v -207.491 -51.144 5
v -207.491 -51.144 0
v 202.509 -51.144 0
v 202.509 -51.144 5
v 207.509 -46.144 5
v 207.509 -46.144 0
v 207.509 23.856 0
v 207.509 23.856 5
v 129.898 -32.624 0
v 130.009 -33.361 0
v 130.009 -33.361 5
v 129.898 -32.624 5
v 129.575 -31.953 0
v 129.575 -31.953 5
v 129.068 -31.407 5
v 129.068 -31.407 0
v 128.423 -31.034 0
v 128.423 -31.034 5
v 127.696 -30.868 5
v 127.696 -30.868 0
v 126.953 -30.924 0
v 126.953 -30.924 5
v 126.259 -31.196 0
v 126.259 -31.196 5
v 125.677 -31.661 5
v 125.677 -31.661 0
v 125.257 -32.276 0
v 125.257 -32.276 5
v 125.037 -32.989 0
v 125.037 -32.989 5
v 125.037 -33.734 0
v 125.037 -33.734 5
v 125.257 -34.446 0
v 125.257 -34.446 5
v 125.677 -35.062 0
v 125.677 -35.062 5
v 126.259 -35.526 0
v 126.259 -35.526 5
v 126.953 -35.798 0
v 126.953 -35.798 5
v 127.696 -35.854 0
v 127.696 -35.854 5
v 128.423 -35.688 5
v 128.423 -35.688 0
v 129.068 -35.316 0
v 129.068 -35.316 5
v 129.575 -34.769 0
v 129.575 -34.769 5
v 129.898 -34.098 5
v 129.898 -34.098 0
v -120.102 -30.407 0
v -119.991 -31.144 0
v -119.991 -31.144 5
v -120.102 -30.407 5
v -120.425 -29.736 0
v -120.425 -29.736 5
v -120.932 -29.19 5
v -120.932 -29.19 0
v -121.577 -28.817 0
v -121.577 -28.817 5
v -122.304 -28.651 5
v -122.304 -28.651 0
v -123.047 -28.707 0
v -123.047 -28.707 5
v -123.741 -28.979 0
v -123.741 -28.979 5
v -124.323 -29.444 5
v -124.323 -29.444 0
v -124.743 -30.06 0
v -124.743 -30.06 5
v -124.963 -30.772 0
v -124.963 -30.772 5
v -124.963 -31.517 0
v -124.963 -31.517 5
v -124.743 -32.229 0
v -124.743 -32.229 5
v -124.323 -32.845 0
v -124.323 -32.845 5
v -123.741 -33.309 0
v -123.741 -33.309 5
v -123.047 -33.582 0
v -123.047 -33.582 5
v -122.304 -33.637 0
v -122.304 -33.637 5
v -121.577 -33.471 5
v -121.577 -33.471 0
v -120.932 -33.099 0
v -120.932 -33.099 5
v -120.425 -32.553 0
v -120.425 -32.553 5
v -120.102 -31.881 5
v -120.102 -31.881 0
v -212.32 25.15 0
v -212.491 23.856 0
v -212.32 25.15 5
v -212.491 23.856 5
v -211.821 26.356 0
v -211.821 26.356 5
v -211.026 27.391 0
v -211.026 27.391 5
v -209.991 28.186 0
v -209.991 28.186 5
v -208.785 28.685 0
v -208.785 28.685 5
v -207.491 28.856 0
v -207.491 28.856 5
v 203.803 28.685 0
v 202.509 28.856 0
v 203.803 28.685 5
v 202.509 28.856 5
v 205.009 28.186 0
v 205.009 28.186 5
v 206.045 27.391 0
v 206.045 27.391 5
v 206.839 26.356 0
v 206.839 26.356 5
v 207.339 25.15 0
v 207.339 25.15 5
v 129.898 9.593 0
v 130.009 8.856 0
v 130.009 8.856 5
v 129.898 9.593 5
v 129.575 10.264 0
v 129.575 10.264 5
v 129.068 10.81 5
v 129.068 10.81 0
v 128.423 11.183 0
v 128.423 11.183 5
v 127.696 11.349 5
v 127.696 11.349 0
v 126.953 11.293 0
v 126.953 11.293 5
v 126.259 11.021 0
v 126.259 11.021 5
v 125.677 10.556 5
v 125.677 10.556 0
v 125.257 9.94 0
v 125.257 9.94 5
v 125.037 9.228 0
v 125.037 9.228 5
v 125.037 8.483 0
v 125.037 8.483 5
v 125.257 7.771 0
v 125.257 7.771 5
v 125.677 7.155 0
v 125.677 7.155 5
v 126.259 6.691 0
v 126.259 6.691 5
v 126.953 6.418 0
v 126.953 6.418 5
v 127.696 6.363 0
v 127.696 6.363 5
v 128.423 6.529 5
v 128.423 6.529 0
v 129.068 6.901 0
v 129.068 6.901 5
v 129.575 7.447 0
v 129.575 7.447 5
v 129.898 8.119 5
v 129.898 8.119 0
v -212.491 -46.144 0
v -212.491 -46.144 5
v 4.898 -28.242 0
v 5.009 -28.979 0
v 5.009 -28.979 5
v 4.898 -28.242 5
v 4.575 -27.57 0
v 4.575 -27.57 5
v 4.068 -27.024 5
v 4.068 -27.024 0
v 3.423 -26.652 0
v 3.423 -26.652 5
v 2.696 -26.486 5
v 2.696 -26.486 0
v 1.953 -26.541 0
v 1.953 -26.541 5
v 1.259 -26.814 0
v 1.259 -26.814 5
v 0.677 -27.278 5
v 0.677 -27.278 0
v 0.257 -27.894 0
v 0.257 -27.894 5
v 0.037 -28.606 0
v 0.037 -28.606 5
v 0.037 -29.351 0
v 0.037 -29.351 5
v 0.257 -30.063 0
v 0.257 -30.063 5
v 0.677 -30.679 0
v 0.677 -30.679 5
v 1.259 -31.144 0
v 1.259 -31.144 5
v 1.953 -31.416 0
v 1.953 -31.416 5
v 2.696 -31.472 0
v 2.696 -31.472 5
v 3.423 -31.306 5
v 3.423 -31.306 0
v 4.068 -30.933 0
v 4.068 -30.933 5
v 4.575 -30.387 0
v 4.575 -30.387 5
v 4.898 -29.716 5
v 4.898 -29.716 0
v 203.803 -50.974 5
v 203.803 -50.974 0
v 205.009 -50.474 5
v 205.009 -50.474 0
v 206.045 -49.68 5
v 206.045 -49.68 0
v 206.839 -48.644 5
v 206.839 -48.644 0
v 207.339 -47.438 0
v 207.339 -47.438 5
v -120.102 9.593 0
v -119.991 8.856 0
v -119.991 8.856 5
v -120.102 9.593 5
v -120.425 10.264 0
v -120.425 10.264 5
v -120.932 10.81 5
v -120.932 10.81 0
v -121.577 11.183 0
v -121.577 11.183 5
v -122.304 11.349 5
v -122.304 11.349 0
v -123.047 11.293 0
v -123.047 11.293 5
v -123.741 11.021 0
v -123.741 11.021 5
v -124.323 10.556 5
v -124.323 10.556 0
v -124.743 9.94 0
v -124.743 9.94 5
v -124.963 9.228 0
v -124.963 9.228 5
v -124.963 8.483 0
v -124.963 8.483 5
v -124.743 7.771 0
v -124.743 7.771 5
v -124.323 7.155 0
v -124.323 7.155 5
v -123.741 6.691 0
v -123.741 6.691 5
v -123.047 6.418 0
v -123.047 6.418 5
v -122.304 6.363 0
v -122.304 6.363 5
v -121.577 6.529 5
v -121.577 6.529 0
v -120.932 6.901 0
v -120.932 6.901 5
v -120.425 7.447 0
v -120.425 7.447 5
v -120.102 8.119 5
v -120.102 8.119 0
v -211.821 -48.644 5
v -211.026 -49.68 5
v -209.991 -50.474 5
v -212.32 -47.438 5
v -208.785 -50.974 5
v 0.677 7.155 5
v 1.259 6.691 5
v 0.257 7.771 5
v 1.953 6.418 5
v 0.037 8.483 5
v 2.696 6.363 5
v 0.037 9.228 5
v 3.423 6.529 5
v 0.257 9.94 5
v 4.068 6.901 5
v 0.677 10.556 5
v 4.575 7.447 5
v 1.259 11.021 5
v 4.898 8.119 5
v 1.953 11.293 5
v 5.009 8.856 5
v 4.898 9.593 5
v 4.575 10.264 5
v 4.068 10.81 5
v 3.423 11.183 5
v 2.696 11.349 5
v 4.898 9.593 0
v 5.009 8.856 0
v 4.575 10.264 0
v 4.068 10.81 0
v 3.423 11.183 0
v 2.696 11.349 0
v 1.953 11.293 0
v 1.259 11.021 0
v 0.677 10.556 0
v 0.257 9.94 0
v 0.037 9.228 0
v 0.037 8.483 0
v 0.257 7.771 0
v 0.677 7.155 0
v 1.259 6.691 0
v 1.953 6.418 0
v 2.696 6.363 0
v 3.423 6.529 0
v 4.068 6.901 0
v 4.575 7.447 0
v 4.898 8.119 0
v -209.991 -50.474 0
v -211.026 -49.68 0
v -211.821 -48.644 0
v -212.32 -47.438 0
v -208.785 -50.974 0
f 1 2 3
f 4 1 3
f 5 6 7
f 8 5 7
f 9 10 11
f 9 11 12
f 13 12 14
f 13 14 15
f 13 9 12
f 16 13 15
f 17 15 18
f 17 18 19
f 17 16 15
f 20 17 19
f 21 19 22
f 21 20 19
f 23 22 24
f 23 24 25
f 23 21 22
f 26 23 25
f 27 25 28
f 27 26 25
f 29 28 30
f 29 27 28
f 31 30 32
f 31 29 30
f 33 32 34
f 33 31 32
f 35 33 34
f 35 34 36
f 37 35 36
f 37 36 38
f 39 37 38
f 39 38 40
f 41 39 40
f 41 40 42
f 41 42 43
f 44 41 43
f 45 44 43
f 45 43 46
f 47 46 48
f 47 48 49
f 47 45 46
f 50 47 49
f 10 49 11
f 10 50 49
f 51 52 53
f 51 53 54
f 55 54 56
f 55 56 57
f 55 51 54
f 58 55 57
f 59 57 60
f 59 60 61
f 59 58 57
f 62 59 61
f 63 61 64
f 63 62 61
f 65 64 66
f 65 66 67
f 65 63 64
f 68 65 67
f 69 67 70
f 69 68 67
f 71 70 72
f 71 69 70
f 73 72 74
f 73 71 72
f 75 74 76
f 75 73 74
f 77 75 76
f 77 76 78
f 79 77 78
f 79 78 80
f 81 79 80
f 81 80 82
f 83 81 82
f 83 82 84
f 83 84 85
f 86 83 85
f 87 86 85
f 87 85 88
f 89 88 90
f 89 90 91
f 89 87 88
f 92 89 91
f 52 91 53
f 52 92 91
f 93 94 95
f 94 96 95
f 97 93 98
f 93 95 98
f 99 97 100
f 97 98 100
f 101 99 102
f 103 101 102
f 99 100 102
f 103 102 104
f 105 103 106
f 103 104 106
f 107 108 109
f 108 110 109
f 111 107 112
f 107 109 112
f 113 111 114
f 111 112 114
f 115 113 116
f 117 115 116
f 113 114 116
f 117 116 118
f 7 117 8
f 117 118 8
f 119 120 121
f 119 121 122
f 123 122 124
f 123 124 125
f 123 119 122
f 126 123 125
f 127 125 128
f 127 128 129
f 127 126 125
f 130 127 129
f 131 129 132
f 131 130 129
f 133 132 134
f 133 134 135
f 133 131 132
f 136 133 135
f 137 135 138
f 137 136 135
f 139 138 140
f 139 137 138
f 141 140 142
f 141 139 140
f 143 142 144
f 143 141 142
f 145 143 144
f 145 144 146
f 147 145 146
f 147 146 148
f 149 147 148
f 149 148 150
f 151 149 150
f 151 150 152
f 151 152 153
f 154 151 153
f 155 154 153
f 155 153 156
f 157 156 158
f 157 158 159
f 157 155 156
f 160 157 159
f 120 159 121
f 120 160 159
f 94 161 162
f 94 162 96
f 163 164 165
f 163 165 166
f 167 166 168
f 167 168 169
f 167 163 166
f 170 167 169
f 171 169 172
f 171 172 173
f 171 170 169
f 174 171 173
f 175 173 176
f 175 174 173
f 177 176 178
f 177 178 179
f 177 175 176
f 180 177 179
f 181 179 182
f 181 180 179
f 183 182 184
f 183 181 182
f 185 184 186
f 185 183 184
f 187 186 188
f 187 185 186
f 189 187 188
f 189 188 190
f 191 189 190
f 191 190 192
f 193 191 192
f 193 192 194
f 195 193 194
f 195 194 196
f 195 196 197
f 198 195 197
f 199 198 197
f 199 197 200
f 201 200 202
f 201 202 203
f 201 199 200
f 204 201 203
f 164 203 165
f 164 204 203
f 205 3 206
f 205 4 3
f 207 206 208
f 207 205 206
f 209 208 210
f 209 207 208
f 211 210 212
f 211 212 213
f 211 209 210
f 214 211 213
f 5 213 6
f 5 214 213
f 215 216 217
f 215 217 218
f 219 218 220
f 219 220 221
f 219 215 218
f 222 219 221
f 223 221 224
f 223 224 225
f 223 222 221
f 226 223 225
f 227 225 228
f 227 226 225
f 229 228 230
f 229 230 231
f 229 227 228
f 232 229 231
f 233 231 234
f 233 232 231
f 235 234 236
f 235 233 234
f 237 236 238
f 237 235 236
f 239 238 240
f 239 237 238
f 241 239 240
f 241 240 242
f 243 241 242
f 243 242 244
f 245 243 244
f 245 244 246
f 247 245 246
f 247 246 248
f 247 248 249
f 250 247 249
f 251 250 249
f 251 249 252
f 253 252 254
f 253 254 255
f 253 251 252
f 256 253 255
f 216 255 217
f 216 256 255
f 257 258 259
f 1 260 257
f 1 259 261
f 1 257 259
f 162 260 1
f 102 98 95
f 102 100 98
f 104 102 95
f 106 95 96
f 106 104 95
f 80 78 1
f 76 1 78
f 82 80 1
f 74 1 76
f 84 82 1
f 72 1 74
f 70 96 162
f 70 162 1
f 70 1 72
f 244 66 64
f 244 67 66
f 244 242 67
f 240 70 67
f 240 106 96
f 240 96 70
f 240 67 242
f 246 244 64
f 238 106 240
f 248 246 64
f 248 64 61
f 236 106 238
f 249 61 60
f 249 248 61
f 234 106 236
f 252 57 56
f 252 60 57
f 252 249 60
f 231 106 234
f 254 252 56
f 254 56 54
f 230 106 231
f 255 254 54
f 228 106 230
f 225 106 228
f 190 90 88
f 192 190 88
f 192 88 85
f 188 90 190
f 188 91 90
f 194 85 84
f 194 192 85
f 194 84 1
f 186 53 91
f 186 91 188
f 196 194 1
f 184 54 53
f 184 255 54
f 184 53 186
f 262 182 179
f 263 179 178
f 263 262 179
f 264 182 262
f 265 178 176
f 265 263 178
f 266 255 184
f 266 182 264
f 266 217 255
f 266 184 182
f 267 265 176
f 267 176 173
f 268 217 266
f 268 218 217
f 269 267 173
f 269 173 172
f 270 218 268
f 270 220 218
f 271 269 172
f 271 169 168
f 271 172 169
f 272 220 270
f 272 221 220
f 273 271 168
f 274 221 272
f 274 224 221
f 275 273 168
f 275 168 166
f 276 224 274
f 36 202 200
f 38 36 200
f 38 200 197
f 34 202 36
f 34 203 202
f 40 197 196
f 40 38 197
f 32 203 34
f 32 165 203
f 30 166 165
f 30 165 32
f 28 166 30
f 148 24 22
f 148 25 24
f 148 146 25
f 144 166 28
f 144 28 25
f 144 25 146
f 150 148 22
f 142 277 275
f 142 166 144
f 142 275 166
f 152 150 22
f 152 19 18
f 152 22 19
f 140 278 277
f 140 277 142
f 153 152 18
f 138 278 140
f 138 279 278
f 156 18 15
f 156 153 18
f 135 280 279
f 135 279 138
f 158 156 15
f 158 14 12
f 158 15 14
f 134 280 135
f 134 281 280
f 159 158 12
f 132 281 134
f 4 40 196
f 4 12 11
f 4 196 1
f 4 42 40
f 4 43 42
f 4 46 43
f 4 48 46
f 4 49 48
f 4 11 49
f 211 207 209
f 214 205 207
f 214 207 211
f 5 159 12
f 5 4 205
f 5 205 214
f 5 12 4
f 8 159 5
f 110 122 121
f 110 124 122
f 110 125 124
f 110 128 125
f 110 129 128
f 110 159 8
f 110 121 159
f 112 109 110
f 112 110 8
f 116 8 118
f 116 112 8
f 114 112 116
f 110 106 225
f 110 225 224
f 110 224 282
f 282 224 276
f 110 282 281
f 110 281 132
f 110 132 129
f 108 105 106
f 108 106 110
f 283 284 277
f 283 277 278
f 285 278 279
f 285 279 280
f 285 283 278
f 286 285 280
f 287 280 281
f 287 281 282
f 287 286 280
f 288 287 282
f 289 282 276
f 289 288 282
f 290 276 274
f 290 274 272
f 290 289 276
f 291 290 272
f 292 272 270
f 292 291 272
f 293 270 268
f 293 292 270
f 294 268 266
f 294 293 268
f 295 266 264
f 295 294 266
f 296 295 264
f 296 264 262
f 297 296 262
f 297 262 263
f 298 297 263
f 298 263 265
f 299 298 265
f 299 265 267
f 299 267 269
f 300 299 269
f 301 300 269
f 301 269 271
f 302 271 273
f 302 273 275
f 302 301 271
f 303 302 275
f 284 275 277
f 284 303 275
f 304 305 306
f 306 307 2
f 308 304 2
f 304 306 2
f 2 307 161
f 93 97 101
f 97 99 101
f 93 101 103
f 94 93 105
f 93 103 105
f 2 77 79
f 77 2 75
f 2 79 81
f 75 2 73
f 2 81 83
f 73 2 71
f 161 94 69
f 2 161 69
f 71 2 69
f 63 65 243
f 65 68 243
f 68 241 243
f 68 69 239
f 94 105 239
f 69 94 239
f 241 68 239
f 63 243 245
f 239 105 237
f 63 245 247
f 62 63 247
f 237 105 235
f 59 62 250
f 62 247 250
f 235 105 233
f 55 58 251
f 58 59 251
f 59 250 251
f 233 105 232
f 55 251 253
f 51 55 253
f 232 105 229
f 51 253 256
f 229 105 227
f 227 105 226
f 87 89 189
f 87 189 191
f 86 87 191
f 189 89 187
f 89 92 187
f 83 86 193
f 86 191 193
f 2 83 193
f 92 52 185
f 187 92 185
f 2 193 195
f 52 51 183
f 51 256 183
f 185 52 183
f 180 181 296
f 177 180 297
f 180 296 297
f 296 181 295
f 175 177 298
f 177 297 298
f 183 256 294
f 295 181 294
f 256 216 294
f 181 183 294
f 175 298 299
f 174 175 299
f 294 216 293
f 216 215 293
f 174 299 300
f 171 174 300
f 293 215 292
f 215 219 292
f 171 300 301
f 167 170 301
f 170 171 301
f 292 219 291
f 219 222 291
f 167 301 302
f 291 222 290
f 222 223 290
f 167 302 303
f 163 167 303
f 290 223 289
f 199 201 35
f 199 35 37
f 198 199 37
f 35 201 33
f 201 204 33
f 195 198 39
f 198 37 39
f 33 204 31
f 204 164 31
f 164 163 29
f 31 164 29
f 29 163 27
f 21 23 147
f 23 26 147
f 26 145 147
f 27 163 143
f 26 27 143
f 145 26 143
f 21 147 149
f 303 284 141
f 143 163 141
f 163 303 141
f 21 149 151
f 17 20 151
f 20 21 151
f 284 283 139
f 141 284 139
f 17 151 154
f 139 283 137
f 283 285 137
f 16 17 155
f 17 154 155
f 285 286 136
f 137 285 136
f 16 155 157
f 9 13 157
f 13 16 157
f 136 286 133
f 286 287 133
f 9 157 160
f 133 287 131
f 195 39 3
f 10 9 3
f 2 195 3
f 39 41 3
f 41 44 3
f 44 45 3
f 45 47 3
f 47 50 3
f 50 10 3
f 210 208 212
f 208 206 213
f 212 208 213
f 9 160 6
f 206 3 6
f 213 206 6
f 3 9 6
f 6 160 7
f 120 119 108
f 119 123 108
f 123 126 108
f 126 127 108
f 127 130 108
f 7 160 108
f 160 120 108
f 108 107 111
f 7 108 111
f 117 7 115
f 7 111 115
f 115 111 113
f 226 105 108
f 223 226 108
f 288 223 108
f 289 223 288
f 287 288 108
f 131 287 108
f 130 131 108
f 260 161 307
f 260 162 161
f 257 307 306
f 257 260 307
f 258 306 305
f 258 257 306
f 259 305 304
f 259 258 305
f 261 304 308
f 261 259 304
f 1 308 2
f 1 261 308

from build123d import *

# Parameters (mm, degrees)
SKETCH1_W           = 420
SKETCH1_H           = 80
SKETCH1_R           = 2.5
BOSS_EXTRUDE1_DEPTH = 5
FILLET1_R           = 5


with BuildPart() as part:
    # Sketch1 → Boss-Extrude1 (new body)
    with BuildSketch(Plane.XY):
        with Locations((-2.490697888, -11.144221335)):
            Rectangle(SKETCH1_W, SKETCH1_H)
        with Locations((-122.490697888, -31.144221335)):
            Circle(SKETCH1_R, mode=Mode.SUBTRACT)
        with Locations((-122.490697888, 8.855778665)):
            Circle(SKETCH1_R, mode=Mode.SUBTRACT)
        with Locations((2.509302112, 8.855778665)):
            Circle(SKETCH1_R, mode=Mode.SUBTRACT)
        with Locations((2.509302112, -28.978769478)):
            Circle(SKETCH1_R, mode=Mode.SUBTRACT)
        with Locations((127.509302112, 8.855778665)):
            Circle(SKETCH1_R, mode=Mode.SUBTRACT)
        with Locations((127.509302112, -33.361178677)):
            Circle(SKETCH1_R, mode=Mode.SUBTRACT)
    extrude(amount=BOSS_EXTRUDE1_DEPTH)

    # Fillet1
    fillet1_edges = [part.edges().sort_by_distance(p)[0] for p in [
        (-212.490697888, 28.855778665, 2.5),
        (207.509302112, 28.855778665, 2.5),
        (207.509302112, -51.144221335, 2.5),
        (-212.490697888, -51.144221335, 2.5),
    ]]
    fillet(fillet1_edges, radius=FILLET1_R)


solid = part.part
